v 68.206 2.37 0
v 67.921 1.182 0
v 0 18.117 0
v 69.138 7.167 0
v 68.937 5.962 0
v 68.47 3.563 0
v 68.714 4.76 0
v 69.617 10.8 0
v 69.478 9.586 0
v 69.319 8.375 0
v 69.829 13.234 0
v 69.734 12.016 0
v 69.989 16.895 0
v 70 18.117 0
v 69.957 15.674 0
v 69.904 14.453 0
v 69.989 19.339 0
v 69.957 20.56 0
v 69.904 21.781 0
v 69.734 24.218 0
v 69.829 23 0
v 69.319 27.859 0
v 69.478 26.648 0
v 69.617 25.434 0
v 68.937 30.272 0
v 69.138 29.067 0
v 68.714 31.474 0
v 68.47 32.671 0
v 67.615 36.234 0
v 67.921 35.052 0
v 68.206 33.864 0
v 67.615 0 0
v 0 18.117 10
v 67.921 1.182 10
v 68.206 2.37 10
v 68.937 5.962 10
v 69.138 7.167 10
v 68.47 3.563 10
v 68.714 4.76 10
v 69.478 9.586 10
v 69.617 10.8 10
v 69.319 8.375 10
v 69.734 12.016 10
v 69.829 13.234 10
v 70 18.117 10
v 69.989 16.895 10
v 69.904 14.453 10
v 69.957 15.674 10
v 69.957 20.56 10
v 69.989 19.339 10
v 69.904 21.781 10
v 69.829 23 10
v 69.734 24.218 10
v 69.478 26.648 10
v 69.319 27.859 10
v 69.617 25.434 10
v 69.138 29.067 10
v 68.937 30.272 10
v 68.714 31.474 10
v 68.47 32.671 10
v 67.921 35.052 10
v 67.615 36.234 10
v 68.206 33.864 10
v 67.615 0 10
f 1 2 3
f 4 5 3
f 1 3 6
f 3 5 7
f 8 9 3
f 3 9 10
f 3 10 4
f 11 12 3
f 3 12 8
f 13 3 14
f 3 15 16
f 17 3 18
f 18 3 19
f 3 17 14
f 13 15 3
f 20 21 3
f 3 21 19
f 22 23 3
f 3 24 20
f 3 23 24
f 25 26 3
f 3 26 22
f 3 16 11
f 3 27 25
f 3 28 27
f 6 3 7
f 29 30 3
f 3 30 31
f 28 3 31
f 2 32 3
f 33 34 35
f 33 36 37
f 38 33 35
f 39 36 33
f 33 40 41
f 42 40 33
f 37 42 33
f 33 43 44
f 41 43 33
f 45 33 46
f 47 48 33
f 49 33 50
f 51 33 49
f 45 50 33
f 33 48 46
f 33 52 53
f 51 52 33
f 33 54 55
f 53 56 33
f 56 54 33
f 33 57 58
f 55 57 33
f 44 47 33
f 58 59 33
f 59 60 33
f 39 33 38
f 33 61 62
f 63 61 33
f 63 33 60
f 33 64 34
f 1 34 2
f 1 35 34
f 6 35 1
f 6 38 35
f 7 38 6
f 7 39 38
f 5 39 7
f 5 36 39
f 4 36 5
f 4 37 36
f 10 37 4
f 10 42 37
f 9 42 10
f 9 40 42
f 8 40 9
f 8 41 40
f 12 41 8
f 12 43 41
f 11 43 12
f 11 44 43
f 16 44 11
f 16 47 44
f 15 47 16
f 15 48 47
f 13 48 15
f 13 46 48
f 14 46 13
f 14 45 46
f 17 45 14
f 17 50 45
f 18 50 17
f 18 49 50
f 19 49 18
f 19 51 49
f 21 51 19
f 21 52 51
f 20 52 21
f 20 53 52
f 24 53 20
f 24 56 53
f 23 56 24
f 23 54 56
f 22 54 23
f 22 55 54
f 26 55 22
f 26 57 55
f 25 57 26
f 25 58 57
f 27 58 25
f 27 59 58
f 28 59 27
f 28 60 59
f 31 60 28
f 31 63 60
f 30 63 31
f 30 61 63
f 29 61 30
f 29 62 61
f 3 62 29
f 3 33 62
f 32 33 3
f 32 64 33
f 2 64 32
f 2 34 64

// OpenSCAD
$fn = 32;

// ----------------------------------------------------------------------
// Arc profile plate: sector, 32 points
// ----------------------------------------------------------------------

// --- parameters (mm) ---
sector_angle = 30;        // sector angle, degrees
sector_r = 70;            // outer radius
arc_step = 1;             // sampling step of the arc, degrees
plate_t = 10;             // plate thickness, Z

bbox_x = 2 * sector_r * sin(sector_angle / 2);  // chord of the sector
bbox_y = sector_r;  // depth of the sector (apex to arc)

profile = [[67.615, 0], [67.921, 1.182], [68.206, 2.37], [68.47, 3.563], [68.714, 4.76], [68.937, 5.962], [69.138, 7.167], [69.319, 8.375], [69.478, 9.586], [69.617, 10.8], [69.734, 12.016], [69.829, 13.234], [69.904, 14.453], [69.957, 15.674], [69.989, 16.895], [70, 18.117], [69.989, 19.339], [69.957, 20.56], [69.904, 21.781], [69.829, 23], [69.734, 24.218], [69.617, 25.434], [69.478, 26.648], [69.319, 27.859], [69.138, 29.067], [68.937, 30.272], [68.714, 31.474], [68.47, 32.671], [68.206, 33.864], [67.921, 35.052], [67.615, 36.234], [0, 18.117]];  // primary outline, 32 points, counter clockwise

// --- the one profile operation ---
linear_extrude(height = plate_t) polygon(points = profile);
